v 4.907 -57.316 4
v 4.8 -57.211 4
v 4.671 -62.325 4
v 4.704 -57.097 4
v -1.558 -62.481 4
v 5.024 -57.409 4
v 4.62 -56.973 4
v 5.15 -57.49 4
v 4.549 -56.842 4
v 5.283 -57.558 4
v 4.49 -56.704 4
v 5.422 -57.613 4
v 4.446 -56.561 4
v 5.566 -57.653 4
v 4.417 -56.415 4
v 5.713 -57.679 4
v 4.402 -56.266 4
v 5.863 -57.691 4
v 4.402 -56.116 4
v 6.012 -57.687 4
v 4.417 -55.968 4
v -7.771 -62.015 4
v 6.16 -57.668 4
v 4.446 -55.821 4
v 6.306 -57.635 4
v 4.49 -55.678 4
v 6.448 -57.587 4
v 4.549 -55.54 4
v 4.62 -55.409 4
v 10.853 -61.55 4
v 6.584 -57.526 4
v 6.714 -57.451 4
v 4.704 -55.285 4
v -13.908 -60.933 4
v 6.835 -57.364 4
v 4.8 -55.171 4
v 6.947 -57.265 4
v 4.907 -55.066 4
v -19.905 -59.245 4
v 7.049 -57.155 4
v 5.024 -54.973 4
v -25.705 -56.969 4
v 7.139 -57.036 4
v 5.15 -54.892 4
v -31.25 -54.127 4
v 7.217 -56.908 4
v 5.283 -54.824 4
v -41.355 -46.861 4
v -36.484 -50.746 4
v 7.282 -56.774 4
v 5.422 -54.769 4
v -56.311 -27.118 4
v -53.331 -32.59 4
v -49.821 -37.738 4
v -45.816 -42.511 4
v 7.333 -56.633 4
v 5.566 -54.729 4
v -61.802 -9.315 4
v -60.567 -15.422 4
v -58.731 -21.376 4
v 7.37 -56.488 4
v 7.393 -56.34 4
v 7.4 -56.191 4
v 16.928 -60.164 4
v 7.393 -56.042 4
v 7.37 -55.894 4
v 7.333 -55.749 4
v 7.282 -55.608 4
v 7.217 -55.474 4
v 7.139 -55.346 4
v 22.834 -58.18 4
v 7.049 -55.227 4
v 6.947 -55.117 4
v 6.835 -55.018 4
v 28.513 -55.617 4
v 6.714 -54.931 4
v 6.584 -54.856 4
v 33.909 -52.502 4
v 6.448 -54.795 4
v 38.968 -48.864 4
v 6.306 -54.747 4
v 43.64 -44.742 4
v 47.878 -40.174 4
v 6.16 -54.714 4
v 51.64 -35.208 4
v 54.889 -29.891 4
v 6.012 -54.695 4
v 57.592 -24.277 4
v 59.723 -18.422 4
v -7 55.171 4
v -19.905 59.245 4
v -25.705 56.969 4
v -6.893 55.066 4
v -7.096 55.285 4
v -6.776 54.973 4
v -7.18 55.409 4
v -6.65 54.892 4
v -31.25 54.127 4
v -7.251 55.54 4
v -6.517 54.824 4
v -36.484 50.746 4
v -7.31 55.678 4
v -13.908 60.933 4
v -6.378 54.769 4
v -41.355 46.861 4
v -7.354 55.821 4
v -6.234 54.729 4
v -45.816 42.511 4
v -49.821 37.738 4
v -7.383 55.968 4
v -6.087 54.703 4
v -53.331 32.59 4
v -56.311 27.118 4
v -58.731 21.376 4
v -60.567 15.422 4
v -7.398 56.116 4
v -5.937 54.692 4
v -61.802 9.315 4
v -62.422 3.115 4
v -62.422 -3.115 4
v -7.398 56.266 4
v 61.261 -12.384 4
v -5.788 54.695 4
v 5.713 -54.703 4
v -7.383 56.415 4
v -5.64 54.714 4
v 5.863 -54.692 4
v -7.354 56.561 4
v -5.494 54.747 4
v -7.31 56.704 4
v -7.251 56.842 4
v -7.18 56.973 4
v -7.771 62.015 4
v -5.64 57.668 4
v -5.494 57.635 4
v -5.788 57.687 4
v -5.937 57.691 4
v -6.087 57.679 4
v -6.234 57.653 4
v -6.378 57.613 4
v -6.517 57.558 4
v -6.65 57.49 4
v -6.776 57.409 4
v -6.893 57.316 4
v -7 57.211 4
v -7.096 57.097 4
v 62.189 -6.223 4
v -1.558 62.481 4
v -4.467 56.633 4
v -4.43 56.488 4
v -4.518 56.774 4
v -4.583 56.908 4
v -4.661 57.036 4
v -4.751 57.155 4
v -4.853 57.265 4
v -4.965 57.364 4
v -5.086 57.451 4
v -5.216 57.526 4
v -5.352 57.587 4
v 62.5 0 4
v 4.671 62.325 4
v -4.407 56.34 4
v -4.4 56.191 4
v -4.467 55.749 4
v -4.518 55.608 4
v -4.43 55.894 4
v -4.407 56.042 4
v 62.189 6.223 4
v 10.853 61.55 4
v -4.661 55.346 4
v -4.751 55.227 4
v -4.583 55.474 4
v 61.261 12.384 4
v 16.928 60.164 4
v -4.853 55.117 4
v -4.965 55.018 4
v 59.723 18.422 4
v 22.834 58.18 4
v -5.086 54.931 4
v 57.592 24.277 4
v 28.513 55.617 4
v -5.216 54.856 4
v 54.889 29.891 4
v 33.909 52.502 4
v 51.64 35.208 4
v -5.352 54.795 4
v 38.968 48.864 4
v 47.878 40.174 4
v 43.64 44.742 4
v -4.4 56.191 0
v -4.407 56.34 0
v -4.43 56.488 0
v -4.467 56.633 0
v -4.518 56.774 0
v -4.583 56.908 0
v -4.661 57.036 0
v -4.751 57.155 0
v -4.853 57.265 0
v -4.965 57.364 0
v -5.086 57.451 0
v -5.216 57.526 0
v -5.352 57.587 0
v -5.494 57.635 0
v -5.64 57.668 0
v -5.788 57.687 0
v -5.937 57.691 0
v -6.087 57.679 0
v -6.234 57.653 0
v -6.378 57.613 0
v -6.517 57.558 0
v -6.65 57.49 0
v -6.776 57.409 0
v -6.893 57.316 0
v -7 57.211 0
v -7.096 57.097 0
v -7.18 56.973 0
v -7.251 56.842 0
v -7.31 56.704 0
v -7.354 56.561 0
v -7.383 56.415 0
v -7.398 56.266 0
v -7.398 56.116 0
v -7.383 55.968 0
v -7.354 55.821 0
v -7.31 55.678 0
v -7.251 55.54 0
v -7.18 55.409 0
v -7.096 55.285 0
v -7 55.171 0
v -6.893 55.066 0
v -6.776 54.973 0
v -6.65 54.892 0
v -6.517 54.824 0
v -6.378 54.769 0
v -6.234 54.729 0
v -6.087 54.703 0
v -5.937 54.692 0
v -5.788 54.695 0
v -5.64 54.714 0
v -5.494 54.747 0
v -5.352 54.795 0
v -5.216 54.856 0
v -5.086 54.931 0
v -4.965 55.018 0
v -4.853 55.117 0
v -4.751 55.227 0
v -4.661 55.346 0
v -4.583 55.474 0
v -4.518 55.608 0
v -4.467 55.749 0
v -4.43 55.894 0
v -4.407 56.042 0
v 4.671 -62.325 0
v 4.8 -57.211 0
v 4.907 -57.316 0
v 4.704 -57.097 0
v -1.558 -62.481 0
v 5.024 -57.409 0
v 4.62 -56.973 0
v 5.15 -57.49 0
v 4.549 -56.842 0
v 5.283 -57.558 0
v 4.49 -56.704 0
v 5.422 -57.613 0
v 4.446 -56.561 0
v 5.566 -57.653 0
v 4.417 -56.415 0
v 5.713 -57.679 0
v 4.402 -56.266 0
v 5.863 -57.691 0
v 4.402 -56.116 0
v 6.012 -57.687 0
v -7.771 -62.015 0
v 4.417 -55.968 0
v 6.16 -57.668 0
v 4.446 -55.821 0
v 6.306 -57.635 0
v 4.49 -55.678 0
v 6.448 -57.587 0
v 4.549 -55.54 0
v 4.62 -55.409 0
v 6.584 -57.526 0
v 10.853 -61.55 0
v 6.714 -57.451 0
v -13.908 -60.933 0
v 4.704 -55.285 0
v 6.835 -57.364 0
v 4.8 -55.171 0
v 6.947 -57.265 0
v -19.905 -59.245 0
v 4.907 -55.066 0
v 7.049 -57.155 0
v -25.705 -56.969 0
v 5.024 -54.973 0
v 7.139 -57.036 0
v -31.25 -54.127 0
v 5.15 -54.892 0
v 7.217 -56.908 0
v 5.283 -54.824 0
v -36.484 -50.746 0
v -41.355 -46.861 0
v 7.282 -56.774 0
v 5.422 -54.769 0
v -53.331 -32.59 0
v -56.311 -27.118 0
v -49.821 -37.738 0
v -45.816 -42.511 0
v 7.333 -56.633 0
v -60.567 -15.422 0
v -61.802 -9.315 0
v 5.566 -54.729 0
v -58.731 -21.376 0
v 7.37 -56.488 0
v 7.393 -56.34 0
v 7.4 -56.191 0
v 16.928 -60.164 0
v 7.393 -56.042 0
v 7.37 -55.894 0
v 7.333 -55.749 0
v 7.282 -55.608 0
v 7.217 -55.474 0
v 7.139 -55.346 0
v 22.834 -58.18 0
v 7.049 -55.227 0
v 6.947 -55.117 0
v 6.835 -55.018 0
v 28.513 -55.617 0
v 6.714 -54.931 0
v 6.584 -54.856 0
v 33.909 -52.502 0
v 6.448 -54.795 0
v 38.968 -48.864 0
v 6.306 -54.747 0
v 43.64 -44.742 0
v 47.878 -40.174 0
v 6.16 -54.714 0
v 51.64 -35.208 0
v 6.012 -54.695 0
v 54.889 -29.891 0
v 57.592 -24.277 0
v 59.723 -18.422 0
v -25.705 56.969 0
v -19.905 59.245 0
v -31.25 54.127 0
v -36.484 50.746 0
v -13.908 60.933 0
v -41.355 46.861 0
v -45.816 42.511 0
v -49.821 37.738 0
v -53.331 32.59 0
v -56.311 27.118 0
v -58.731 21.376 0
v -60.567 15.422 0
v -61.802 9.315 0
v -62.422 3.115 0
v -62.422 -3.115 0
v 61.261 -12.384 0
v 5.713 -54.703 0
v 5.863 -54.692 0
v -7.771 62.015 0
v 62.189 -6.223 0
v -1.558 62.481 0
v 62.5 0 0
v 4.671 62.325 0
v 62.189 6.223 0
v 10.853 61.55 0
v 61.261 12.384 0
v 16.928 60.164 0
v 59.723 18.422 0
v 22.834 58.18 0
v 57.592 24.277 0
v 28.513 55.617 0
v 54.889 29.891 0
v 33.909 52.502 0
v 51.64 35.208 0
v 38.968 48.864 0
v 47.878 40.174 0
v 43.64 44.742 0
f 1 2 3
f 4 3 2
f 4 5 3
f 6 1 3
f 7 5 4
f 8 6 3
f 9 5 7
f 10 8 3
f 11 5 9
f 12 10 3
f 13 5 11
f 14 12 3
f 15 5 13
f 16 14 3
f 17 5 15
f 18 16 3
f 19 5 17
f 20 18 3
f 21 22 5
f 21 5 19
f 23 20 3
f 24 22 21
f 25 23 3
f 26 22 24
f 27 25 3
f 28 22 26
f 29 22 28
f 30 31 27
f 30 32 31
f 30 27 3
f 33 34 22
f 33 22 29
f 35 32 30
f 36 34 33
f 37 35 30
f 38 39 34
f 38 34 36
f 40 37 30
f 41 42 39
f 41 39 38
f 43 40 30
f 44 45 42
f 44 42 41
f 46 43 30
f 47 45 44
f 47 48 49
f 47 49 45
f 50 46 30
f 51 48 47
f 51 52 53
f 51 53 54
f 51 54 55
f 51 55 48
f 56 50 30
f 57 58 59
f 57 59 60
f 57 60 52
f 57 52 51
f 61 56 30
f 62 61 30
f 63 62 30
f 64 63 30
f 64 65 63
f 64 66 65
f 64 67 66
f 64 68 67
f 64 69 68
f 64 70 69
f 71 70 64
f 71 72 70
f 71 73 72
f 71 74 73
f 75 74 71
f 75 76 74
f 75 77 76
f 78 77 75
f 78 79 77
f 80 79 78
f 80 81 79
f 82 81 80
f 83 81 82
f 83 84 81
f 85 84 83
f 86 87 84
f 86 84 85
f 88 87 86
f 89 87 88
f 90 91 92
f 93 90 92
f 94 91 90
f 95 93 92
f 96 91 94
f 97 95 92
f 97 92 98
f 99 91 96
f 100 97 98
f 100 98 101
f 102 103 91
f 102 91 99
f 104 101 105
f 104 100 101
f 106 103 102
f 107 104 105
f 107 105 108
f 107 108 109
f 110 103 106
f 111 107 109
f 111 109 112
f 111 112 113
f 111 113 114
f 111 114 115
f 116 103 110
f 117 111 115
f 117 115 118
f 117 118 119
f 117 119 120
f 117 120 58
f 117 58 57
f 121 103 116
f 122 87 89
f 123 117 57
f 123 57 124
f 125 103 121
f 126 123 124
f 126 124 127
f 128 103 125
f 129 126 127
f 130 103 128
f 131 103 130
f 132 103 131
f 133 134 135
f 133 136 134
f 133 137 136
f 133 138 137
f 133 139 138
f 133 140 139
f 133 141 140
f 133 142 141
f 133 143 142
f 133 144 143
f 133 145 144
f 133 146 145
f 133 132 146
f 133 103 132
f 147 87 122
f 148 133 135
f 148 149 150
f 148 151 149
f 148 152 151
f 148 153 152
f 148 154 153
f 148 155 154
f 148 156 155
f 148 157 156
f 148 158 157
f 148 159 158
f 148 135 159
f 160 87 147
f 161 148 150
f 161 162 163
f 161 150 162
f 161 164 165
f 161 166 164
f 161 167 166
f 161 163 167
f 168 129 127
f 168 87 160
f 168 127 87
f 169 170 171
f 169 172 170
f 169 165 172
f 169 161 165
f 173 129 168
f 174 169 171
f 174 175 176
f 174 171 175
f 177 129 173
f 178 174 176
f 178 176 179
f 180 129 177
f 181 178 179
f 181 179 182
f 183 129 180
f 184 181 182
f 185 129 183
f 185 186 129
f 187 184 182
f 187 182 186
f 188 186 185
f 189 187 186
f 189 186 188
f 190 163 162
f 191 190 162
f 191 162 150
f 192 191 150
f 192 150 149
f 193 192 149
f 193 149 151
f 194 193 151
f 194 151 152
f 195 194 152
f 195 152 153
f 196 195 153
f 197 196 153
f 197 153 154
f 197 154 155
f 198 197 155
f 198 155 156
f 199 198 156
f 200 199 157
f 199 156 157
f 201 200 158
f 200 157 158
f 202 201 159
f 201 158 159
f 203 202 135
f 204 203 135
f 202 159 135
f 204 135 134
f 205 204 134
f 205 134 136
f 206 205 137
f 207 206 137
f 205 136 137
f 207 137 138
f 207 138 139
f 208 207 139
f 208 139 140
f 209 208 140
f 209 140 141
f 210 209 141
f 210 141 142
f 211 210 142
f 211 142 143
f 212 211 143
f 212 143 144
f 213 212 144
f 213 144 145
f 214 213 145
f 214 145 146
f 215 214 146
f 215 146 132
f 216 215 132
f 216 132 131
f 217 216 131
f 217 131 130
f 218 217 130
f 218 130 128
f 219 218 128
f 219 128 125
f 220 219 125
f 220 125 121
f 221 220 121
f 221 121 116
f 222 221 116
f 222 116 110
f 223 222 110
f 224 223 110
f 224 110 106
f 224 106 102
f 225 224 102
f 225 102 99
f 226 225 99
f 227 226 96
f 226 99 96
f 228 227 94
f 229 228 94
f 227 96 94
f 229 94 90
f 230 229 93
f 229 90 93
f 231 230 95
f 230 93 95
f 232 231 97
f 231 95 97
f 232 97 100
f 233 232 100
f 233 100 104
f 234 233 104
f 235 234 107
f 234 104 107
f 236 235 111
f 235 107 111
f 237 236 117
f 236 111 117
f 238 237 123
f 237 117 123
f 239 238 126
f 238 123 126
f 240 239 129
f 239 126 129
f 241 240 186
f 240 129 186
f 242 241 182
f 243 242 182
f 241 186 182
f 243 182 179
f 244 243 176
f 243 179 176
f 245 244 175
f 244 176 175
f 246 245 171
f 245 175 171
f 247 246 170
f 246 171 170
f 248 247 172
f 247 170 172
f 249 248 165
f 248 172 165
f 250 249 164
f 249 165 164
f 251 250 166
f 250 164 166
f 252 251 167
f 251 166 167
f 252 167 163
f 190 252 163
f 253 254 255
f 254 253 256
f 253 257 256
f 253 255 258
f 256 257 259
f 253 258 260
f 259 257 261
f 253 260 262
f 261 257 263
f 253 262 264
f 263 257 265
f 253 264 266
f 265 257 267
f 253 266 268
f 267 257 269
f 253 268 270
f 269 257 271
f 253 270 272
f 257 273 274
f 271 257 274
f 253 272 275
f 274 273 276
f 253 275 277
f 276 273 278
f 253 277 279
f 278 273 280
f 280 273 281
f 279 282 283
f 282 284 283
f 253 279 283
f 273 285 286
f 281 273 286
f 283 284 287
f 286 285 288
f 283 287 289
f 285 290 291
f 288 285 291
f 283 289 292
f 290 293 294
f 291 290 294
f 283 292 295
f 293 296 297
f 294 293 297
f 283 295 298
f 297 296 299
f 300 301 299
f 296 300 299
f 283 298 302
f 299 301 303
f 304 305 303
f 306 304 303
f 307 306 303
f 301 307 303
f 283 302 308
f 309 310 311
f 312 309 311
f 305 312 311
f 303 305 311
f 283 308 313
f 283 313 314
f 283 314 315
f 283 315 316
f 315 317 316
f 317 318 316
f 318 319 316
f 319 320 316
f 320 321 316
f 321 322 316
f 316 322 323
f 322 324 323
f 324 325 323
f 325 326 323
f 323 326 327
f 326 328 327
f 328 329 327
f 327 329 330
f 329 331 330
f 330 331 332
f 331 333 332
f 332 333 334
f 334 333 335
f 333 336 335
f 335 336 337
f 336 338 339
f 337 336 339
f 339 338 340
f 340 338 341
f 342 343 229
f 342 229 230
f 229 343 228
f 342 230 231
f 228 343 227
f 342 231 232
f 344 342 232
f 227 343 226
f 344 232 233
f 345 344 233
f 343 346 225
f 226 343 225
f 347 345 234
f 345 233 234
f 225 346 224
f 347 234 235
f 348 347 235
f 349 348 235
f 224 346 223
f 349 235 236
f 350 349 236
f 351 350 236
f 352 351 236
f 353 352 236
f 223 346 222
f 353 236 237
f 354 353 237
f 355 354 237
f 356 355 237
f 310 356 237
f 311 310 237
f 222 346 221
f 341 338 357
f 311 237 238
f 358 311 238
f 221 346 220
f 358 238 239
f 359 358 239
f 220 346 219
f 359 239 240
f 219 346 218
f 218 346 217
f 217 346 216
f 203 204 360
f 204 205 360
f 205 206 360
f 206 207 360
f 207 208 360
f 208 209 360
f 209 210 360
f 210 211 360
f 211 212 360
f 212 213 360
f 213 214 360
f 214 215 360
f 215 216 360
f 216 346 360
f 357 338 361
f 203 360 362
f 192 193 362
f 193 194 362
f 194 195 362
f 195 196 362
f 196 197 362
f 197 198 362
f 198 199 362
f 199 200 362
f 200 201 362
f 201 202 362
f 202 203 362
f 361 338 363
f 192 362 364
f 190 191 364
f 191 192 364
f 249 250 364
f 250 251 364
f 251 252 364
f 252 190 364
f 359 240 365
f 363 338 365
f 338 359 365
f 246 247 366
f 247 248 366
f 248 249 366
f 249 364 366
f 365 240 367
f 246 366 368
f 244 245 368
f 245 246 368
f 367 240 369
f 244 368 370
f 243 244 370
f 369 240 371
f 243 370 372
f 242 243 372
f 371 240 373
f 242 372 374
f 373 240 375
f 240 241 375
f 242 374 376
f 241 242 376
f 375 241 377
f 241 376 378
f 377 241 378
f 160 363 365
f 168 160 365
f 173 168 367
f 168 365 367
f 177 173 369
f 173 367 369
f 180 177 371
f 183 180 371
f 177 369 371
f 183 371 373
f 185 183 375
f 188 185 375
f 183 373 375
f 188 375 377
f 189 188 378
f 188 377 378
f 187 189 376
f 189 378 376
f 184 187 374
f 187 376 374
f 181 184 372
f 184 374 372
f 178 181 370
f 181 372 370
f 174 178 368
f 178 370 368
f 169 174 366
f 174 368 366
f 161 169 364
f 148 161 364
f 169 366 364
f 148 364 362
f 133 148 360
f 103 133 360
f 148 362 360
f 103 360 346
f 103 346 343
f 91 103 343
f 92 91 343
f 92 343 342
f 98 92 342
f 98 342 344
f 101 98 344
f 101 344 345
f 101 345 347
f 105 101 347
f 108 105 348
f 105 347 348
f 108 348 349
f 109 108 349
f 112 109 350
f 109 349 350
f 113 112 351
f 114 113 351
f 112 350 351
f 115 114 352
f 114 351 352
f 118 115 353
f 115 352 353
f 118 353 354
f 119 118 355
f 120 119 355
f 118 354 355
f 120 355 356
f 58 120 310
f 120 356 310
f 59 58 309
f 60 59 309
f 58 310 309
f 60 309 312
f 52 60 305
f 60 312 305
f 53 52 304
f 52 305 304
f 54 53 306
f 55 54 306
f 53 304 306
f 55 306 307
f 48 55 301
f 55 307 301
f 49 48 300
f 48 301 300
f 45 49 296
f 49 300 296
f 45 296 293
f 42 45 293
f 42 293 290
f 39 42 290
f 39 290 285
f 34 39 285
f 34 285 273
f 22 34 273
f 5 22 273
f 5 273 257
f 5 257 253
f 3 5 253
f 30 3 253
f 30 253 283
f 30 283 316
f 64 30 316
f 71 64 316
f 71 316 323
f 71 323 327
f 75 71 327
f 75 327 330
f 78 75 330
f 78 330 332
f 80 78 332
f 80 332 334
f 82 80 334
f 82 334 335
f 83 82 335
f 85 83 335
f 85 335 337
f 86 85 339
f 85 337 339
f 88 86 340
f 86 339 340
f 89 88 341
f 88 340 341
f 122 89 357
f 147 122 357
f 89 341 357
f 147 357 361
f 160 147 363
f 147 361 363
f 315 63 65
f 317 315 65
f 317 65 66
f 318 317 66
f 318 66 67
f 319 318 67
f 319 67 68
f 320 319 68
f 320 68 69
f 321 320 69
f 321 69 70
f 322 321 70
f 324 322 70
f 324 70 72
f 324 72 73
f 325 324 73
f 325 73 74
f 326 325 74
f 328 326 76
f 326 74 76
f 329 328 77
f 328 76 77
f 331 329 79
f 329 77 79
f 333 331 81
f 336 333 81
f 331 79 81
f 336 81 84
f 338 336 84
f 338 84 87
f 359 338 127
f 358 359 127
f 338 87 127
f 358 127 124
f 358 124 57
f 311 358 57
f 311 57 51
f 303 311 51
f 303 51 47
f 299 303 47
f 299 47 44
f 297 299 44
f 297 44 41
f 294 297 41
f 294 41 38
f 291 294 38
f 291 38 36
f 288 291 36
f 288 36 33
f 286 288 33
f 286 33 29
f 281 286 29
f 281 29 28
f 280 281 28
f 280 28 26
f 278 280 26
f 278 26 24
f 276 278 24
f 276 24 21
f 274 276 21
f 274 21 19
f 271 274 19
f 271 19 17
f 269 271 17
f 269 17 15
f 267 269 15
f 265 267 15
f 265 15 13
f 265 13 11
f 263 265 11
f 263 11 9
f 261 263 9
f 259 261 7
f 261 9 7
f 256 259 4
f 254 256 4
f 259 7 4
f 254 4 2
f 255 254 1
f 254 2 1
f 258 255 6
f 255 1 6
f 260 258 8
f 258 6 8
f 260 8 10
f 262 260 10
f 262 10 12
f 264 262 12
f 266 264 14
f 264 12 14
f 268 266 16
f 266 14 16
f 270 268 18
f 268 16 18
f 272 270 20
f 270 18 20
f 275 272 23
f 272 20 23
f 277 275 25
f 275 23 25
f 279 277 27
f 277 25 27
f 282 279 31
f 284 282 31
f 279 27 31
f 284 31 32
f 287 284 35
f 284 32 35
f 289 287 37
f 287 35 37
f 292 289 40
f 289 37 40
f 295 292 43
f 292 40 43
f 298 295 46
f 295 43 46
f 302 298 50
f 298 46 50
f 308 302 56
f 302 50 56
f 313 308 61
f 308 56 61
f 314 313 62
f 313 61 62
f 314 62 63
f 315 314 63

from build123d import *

# Parameters (mm, degrees)
F0_R     = 62.5
F1_DEPTH = 4
F2_R     = 1.5
F3_DEPTH = 4.001
F4_R     = 1.5
F5_DEPTH = 4.001


with BuildPart() as f1:
    # F0 (on Top) → F1 (new body)
    with BuildSketch(Plane.XY):
        Circle(F0_R)
    extrude(amount=F1_DEPTH)

    # F2 (on face) → F3 (cut, through all)
    with BuildSketch(Plane.XY.offset(4)):
        with Locations((-5.9, 56.191102)):
            Circle(F2_R)
    extrude(amount=-F3_DEPTH, mode=Mode.SUBTRACT)

    # F4 (on face) → F5 (cut, through all)
    with BuildSketch(Plane.XY.offset(4)):
        with Locations((5.9, -56.191102)):
            Circle(F4_R)
    extrude(amount=-F5_DEPTH, mode=Mode.SUBTRACT)


solid = f1.part
